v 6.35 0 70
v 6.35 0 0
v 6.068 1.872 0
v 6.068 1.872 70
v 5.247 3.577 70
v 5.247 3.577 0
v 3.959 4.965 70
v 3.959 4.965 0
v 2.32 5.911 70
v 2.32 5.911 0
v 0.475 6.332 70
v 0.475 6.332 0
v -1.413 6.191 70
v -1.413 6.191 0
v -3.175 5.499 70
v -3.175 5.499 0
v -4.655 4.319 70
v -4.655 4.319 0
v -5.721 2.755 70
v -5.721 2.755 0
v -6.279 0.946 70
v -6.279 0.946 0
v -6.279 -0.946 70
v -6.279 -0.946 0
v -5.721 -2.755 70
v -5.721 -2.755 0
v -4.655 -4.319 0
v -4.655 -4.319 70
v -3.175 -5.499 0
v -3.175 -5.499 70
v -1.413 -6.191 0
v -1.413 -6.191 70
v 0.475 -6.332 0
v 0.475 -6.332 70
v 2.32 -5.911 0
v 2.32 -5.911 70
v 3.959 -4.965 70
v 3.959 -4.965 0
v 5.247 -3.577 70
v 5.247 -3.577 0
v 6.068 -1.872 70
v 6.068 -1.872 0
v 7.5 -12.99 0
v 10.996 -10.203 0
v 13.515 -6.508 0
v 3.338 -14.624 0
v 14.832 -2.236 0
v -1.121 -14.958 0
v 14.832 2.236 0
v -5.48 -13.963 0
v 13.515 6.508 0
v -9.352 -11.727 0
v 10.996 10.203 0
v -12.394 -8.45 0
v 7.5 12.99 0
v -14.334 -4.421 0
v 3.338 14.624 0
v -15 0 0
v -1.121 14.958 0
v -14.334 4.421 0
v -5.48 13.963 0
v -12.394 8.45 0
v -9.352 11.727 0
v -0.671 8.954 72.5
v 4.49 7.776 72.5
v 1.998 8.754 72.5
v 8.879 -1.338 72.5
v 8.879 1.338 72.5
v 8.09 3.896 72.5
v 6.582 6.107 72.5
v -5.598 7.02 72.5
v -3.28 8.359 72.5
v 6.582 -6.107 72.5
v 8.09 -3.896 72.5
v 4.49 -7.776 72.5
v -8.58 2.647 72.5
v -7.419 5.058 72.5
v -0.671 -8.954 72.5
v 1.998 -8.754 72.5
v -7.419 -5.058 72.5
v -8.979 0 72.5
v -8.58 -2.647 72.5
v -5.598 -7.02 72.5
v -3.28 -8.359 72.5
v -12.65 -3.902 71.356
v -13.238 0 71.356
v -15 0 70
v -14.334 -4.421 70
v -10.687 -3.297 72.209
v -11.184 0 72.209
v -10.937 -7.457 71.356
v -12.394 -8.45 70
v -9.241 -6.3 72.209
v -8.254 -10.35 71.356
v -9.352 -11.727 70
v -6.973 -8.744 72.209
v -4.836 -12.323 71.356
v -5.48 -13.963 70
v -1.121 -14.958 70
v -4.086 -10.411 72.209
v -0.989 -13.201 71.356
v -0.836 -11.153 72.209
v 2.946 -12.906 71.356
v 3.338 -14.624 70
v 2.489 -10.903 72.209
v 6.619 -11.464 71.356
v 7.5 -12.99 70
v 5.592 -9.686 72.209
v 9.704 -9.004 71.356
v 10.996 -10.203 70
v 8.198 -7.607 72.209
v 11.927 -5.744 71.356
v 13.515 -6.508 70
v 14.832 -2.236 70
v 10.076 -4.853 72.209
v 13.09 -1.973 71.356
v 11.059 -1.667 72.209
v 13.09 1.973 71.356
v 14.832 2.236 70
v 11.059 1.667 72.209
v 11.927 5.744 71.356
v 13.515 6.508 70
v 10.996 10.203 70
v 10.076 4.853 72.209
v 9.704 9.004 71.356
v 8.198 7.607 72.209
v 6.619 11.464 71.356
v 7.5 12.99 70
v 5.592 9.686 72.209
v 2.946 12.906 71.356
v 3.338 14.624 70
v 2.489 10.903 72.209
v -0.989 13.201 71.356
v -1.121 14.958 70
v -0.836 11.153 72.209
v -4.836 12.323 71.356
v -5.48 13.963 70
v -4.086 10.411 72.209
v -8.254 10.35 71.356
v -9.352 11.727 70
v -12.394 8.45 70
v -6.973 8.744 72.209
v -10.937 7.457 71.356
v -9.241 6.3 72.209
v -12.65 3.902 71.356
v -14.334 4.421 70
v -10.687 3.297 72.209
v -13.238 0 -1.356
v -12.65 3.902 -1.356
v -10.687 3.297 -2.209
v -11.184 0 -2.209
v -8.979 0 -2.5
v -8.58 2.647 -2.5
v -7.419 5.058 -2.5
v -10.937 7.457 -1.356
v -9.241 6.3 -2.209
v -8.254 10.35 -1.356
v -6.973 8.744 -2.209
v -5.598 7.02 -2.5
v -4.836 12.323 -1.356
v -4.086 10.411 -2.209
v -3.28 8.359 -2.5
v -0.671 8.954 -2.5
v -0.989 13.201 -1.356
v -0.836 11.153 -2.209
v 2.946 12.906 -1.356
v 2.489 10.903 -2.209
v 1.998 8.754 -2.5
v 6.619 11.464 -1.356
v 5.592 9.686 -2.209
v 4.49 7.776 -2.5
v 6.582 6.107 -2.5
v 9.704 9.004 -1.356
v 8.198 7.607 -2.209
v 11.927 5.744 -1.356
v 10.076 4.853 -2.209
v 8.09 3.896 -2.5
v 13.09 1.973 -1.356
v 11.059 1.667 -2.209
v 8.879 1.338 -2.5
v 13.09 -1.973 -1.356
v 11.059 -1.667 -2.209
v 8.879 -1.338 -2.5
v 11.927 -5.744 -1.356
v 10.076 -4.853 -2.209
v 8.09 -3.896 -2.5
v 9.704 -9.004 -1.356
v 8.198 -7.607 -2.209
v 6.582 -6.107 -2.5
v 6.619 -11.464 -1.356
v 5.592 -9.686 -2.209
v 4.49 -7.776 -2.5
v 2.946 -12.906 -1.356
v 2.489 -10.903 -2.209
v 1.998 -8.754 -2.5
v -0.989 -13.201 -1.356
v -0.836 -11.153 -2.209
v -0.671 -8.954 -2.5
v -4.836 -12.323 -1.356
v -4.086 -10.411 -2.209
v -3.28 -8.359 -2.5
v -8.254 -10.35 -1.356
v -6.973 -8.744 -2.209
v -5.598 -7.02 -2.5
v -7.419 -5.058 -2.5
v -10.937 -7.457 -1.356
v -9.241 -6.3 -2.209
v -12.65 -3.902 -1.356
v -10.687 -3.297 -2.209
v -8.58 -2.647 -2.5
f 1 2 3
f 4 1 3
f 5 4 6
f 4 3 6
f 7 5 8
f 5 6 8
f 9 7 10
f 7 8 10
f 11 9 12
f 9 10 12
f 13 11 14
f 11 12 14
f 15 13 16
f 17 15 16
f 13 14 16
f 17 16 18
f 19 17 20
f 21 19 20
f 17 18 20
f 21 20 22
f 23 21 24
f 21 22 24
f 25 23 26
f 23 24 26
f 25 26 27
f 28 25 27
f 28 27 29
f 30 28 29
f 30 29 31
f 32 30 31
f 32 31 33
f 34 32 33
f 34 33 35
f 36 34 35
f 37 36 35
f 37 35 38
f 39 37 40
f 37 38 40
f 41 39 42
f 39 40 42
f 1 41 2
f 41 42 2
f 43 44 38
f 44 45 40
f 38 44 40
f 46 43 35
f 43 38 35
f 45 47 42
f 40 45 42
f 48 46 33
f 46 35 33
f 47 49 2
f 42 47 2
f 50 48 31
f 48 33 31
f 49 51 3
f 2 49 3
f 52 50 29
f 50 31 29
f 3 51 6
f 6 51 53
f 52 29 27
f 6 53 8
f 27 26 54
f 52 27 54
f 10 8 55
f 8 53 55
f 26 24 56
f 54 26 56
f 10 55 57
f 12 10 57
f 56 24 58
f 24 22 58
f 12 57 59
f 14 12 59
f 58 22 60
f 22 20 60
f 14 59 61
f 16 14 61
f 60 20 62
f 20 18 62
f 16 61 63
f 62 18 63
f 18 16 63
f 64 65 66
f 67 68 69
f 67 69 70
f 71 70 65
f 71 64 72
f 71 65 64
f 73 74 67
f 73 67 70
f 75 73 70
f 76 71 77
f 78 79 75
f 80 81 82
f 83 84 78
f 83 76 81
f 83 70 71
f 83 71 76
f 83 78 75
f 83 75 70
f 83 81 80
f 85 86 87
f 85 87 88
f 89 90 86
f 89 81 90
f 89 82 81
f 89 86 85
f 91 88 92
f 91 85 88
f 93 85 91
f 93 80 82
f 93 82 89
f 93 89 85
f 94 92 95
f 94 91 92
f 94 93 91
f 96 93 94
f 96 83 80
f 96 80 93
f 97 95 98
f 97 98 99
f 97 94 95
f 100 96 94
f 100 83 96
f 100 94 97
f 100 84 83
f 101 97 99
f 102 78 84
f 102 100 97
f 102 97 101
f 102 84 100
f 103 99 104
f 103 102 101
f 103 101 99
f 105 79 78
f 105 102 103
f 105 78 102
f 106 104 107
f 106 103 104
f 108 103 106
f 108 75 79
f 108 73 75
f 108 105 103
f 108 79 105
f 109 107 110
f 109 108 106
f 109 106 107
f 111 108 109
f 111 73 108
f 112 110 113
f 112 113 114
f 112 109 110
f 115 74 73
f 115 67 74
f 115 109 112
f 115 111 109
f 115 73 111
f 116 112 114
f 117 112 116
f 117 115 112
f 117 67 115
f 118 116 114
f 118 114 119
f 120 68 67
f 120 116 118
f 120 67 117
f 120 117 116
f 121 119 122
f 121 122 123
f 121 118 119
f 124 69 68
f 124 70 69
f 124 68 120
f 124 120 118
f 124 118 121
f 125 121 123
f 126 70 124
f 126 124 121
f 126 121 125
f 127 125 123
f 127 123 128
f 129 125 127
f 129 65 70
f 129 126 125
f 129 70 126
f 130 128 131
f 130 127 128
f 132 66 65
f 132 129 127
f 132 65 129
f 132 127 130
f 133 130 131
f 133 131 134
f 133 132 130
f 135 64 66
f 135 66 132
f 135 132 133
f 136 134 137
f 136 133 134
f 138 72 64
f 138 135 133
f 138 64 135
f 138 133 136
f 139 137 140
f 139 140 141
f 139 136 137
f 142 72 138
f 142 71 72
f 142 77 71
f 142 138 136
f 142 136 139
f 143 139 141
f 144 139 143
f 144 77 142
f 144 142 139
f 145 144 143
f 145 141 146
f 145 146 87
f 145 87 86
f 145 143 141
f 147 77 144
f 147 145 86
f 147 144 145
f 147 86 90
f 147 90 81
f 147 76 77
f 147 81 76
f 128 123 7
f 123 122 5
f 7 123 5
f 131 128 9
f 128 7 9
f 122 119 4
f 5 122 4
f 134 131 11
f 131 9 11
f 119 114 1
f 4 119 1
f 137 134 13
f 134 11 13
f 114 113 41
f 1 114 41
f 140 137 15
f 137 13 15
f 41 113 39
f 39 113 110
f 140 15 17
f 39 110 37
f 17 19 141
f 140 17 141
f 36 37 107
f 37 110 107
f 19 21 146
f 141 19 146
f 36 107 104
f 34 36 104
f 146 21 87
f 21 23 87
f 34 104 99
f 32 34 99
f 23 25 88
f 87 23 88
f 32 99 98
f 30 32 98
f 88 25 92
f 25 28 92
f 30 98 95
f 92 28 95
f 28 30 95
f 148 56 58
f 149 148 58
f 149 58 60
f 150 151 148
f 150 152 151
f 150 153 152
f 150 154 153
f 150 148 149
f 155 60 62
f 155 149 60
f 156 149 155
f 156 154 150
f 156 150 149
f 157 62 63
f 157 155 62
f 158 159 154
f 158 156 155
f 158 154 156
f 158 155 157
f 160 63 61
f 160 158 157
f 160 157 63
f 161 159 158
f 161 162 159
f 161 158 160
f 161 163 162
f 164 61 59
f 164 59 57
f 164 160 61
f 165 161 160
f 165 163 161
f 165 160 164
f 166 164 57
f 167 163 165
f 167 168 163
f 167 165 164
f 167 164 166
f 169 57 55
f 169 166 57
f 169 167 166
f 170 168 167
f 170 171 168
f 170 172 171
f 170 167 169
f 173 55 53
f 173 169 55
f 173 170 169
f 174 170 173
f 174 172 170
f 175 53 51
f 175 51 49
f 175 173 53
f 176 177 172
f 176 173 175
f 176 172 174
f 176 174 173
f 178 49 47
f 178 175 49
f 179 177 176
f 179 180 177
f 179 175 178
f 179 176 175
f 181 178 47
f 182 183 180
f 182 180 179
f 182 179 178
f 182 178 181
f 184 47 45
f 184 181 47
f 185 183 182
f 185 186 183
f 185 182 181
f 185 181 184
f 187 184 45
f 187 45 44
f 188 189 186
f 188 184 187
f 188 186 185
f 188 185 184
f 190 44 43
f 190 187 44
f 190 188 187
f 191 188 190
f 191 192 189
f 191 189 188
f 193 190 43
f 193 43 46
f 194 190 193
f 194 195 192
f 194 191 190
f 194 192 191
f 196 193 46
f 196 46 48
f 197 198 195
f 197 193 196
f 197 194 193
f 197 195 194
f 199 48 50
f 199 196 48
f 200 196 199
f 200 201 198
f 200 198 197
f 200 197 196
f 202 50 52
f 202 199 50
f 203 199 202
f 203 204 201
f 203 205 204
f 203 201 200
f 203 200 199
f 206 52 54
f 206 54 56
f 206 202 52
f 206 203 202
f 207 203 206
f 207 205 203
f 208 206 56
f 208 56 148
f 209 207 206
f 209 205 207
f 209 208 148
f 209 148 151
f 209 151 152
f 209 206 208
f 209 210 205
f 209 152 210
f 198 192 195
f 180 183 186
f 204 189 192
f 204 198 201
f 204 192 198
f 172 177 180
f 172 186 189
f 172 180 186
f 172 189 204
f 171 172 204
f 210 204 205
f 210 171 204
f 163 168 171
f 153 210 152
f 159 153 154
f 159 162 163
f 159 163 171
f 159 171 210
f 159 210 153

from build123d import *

# Parameters (mm, degrees)
SKETCH1_R           = 6.35
BOSS_EXTRUDE1_DEPTH = 70
SKETCH2_R           = 15
BOSS_EXTRUDE2_DEPTH = 2.5
BOSS_EXTRUDE3_START = 2.5
SKETCH3_R           = 15
BOSS_EXTRUDE3_DEPTH = 2.5
FILLET1_R           = 8.5


with BuildPart() as part:
    # Sketch1 → Boss-Extrude1 (new body)
    with BuildSketch(Plane.XY):
        Circle(SKETCH1_R)
    extrude(amount=BOSS_EXTRUDE1_DEPTH)

    # Sketch2 → Boss-Extrude2 (add)
    with BuildSketch(Plane(origin=(0, 0, 0), x_dir=(-1, 0, 0), z_dir=(0, 0, -1))):
        Circle(SKETCH2_R)
    extrude(amount=BOSS_EXTRUDE2_DEPTH)

    # Sketch3 → Boss-Extrude3 (add)
    with BuildSketch(Plane.XY.offset(70).offset(BOSS_EXTRUDE3_START)):
        with Locations(Location((0, 0, 0), (0, 0, 180))):
            Circle(SKETCH3_R)
    extrude(amount=-BOSS_EXTRUDE3_DEPTH)

    # Fillet1
    # the kernel refuses this fillet: 8.5 mm, written as the material it takes off along each edge
    with BuildSketch(Plane(origin=(0, 0, 72.5), x_dir=(-1, 0, 0), z_dir=(0, 1, 0))) as fillet1_piece_1:
        with BuildLine():
            CenterArc((8.979202711, -8.5), FILLET1_R, 44.900872156, 45.099127844)
            Line((8.979202711, 0), (8.979202711, 0.17))
            Line((8.979202711, 0.17), (15, 0.17))
            Line((15, 0.17), (15.17, 0))
            ThreePointArc((15.17, 0), (15.17, -1.25), (15.120415946, -2.38))
            Line((15.120415946, -2.38), (15, -2.5))
        make_face()
    revolve(axis=Axis((0, 0, 72.5), (0, 0, 1)), mode=Mode.SUBTRACT)
    with BuildSketch(Plane(origin=(0, 0, -2.5), x_dir=(-1, 0, 0), z_dir=(0, -1, 0))) as fillet1_piece_2:
        with BuildLine():
            CenterArc((8.979202711, -8.5), FILLET1_R, 44.900872156, 45.099127844)
            Line((8.979202711, 0), (8.979202711, 0.17))
            Line((8.979202711, 0.17), (15, 0.17))
            Line((15, 0.17), (15.17, 0))
            ThreePointArc((15.17, 0), (15.17, -1.25), (15.120415946, -2.38))
            Line((15.120415946, -2.38), (15, -2.5))
        make_face()
    revolve(axis=Axis((0, 0, -2.5), (0, 0, -1)), mode=Mode.SUBTRACT)


solid = part.part
